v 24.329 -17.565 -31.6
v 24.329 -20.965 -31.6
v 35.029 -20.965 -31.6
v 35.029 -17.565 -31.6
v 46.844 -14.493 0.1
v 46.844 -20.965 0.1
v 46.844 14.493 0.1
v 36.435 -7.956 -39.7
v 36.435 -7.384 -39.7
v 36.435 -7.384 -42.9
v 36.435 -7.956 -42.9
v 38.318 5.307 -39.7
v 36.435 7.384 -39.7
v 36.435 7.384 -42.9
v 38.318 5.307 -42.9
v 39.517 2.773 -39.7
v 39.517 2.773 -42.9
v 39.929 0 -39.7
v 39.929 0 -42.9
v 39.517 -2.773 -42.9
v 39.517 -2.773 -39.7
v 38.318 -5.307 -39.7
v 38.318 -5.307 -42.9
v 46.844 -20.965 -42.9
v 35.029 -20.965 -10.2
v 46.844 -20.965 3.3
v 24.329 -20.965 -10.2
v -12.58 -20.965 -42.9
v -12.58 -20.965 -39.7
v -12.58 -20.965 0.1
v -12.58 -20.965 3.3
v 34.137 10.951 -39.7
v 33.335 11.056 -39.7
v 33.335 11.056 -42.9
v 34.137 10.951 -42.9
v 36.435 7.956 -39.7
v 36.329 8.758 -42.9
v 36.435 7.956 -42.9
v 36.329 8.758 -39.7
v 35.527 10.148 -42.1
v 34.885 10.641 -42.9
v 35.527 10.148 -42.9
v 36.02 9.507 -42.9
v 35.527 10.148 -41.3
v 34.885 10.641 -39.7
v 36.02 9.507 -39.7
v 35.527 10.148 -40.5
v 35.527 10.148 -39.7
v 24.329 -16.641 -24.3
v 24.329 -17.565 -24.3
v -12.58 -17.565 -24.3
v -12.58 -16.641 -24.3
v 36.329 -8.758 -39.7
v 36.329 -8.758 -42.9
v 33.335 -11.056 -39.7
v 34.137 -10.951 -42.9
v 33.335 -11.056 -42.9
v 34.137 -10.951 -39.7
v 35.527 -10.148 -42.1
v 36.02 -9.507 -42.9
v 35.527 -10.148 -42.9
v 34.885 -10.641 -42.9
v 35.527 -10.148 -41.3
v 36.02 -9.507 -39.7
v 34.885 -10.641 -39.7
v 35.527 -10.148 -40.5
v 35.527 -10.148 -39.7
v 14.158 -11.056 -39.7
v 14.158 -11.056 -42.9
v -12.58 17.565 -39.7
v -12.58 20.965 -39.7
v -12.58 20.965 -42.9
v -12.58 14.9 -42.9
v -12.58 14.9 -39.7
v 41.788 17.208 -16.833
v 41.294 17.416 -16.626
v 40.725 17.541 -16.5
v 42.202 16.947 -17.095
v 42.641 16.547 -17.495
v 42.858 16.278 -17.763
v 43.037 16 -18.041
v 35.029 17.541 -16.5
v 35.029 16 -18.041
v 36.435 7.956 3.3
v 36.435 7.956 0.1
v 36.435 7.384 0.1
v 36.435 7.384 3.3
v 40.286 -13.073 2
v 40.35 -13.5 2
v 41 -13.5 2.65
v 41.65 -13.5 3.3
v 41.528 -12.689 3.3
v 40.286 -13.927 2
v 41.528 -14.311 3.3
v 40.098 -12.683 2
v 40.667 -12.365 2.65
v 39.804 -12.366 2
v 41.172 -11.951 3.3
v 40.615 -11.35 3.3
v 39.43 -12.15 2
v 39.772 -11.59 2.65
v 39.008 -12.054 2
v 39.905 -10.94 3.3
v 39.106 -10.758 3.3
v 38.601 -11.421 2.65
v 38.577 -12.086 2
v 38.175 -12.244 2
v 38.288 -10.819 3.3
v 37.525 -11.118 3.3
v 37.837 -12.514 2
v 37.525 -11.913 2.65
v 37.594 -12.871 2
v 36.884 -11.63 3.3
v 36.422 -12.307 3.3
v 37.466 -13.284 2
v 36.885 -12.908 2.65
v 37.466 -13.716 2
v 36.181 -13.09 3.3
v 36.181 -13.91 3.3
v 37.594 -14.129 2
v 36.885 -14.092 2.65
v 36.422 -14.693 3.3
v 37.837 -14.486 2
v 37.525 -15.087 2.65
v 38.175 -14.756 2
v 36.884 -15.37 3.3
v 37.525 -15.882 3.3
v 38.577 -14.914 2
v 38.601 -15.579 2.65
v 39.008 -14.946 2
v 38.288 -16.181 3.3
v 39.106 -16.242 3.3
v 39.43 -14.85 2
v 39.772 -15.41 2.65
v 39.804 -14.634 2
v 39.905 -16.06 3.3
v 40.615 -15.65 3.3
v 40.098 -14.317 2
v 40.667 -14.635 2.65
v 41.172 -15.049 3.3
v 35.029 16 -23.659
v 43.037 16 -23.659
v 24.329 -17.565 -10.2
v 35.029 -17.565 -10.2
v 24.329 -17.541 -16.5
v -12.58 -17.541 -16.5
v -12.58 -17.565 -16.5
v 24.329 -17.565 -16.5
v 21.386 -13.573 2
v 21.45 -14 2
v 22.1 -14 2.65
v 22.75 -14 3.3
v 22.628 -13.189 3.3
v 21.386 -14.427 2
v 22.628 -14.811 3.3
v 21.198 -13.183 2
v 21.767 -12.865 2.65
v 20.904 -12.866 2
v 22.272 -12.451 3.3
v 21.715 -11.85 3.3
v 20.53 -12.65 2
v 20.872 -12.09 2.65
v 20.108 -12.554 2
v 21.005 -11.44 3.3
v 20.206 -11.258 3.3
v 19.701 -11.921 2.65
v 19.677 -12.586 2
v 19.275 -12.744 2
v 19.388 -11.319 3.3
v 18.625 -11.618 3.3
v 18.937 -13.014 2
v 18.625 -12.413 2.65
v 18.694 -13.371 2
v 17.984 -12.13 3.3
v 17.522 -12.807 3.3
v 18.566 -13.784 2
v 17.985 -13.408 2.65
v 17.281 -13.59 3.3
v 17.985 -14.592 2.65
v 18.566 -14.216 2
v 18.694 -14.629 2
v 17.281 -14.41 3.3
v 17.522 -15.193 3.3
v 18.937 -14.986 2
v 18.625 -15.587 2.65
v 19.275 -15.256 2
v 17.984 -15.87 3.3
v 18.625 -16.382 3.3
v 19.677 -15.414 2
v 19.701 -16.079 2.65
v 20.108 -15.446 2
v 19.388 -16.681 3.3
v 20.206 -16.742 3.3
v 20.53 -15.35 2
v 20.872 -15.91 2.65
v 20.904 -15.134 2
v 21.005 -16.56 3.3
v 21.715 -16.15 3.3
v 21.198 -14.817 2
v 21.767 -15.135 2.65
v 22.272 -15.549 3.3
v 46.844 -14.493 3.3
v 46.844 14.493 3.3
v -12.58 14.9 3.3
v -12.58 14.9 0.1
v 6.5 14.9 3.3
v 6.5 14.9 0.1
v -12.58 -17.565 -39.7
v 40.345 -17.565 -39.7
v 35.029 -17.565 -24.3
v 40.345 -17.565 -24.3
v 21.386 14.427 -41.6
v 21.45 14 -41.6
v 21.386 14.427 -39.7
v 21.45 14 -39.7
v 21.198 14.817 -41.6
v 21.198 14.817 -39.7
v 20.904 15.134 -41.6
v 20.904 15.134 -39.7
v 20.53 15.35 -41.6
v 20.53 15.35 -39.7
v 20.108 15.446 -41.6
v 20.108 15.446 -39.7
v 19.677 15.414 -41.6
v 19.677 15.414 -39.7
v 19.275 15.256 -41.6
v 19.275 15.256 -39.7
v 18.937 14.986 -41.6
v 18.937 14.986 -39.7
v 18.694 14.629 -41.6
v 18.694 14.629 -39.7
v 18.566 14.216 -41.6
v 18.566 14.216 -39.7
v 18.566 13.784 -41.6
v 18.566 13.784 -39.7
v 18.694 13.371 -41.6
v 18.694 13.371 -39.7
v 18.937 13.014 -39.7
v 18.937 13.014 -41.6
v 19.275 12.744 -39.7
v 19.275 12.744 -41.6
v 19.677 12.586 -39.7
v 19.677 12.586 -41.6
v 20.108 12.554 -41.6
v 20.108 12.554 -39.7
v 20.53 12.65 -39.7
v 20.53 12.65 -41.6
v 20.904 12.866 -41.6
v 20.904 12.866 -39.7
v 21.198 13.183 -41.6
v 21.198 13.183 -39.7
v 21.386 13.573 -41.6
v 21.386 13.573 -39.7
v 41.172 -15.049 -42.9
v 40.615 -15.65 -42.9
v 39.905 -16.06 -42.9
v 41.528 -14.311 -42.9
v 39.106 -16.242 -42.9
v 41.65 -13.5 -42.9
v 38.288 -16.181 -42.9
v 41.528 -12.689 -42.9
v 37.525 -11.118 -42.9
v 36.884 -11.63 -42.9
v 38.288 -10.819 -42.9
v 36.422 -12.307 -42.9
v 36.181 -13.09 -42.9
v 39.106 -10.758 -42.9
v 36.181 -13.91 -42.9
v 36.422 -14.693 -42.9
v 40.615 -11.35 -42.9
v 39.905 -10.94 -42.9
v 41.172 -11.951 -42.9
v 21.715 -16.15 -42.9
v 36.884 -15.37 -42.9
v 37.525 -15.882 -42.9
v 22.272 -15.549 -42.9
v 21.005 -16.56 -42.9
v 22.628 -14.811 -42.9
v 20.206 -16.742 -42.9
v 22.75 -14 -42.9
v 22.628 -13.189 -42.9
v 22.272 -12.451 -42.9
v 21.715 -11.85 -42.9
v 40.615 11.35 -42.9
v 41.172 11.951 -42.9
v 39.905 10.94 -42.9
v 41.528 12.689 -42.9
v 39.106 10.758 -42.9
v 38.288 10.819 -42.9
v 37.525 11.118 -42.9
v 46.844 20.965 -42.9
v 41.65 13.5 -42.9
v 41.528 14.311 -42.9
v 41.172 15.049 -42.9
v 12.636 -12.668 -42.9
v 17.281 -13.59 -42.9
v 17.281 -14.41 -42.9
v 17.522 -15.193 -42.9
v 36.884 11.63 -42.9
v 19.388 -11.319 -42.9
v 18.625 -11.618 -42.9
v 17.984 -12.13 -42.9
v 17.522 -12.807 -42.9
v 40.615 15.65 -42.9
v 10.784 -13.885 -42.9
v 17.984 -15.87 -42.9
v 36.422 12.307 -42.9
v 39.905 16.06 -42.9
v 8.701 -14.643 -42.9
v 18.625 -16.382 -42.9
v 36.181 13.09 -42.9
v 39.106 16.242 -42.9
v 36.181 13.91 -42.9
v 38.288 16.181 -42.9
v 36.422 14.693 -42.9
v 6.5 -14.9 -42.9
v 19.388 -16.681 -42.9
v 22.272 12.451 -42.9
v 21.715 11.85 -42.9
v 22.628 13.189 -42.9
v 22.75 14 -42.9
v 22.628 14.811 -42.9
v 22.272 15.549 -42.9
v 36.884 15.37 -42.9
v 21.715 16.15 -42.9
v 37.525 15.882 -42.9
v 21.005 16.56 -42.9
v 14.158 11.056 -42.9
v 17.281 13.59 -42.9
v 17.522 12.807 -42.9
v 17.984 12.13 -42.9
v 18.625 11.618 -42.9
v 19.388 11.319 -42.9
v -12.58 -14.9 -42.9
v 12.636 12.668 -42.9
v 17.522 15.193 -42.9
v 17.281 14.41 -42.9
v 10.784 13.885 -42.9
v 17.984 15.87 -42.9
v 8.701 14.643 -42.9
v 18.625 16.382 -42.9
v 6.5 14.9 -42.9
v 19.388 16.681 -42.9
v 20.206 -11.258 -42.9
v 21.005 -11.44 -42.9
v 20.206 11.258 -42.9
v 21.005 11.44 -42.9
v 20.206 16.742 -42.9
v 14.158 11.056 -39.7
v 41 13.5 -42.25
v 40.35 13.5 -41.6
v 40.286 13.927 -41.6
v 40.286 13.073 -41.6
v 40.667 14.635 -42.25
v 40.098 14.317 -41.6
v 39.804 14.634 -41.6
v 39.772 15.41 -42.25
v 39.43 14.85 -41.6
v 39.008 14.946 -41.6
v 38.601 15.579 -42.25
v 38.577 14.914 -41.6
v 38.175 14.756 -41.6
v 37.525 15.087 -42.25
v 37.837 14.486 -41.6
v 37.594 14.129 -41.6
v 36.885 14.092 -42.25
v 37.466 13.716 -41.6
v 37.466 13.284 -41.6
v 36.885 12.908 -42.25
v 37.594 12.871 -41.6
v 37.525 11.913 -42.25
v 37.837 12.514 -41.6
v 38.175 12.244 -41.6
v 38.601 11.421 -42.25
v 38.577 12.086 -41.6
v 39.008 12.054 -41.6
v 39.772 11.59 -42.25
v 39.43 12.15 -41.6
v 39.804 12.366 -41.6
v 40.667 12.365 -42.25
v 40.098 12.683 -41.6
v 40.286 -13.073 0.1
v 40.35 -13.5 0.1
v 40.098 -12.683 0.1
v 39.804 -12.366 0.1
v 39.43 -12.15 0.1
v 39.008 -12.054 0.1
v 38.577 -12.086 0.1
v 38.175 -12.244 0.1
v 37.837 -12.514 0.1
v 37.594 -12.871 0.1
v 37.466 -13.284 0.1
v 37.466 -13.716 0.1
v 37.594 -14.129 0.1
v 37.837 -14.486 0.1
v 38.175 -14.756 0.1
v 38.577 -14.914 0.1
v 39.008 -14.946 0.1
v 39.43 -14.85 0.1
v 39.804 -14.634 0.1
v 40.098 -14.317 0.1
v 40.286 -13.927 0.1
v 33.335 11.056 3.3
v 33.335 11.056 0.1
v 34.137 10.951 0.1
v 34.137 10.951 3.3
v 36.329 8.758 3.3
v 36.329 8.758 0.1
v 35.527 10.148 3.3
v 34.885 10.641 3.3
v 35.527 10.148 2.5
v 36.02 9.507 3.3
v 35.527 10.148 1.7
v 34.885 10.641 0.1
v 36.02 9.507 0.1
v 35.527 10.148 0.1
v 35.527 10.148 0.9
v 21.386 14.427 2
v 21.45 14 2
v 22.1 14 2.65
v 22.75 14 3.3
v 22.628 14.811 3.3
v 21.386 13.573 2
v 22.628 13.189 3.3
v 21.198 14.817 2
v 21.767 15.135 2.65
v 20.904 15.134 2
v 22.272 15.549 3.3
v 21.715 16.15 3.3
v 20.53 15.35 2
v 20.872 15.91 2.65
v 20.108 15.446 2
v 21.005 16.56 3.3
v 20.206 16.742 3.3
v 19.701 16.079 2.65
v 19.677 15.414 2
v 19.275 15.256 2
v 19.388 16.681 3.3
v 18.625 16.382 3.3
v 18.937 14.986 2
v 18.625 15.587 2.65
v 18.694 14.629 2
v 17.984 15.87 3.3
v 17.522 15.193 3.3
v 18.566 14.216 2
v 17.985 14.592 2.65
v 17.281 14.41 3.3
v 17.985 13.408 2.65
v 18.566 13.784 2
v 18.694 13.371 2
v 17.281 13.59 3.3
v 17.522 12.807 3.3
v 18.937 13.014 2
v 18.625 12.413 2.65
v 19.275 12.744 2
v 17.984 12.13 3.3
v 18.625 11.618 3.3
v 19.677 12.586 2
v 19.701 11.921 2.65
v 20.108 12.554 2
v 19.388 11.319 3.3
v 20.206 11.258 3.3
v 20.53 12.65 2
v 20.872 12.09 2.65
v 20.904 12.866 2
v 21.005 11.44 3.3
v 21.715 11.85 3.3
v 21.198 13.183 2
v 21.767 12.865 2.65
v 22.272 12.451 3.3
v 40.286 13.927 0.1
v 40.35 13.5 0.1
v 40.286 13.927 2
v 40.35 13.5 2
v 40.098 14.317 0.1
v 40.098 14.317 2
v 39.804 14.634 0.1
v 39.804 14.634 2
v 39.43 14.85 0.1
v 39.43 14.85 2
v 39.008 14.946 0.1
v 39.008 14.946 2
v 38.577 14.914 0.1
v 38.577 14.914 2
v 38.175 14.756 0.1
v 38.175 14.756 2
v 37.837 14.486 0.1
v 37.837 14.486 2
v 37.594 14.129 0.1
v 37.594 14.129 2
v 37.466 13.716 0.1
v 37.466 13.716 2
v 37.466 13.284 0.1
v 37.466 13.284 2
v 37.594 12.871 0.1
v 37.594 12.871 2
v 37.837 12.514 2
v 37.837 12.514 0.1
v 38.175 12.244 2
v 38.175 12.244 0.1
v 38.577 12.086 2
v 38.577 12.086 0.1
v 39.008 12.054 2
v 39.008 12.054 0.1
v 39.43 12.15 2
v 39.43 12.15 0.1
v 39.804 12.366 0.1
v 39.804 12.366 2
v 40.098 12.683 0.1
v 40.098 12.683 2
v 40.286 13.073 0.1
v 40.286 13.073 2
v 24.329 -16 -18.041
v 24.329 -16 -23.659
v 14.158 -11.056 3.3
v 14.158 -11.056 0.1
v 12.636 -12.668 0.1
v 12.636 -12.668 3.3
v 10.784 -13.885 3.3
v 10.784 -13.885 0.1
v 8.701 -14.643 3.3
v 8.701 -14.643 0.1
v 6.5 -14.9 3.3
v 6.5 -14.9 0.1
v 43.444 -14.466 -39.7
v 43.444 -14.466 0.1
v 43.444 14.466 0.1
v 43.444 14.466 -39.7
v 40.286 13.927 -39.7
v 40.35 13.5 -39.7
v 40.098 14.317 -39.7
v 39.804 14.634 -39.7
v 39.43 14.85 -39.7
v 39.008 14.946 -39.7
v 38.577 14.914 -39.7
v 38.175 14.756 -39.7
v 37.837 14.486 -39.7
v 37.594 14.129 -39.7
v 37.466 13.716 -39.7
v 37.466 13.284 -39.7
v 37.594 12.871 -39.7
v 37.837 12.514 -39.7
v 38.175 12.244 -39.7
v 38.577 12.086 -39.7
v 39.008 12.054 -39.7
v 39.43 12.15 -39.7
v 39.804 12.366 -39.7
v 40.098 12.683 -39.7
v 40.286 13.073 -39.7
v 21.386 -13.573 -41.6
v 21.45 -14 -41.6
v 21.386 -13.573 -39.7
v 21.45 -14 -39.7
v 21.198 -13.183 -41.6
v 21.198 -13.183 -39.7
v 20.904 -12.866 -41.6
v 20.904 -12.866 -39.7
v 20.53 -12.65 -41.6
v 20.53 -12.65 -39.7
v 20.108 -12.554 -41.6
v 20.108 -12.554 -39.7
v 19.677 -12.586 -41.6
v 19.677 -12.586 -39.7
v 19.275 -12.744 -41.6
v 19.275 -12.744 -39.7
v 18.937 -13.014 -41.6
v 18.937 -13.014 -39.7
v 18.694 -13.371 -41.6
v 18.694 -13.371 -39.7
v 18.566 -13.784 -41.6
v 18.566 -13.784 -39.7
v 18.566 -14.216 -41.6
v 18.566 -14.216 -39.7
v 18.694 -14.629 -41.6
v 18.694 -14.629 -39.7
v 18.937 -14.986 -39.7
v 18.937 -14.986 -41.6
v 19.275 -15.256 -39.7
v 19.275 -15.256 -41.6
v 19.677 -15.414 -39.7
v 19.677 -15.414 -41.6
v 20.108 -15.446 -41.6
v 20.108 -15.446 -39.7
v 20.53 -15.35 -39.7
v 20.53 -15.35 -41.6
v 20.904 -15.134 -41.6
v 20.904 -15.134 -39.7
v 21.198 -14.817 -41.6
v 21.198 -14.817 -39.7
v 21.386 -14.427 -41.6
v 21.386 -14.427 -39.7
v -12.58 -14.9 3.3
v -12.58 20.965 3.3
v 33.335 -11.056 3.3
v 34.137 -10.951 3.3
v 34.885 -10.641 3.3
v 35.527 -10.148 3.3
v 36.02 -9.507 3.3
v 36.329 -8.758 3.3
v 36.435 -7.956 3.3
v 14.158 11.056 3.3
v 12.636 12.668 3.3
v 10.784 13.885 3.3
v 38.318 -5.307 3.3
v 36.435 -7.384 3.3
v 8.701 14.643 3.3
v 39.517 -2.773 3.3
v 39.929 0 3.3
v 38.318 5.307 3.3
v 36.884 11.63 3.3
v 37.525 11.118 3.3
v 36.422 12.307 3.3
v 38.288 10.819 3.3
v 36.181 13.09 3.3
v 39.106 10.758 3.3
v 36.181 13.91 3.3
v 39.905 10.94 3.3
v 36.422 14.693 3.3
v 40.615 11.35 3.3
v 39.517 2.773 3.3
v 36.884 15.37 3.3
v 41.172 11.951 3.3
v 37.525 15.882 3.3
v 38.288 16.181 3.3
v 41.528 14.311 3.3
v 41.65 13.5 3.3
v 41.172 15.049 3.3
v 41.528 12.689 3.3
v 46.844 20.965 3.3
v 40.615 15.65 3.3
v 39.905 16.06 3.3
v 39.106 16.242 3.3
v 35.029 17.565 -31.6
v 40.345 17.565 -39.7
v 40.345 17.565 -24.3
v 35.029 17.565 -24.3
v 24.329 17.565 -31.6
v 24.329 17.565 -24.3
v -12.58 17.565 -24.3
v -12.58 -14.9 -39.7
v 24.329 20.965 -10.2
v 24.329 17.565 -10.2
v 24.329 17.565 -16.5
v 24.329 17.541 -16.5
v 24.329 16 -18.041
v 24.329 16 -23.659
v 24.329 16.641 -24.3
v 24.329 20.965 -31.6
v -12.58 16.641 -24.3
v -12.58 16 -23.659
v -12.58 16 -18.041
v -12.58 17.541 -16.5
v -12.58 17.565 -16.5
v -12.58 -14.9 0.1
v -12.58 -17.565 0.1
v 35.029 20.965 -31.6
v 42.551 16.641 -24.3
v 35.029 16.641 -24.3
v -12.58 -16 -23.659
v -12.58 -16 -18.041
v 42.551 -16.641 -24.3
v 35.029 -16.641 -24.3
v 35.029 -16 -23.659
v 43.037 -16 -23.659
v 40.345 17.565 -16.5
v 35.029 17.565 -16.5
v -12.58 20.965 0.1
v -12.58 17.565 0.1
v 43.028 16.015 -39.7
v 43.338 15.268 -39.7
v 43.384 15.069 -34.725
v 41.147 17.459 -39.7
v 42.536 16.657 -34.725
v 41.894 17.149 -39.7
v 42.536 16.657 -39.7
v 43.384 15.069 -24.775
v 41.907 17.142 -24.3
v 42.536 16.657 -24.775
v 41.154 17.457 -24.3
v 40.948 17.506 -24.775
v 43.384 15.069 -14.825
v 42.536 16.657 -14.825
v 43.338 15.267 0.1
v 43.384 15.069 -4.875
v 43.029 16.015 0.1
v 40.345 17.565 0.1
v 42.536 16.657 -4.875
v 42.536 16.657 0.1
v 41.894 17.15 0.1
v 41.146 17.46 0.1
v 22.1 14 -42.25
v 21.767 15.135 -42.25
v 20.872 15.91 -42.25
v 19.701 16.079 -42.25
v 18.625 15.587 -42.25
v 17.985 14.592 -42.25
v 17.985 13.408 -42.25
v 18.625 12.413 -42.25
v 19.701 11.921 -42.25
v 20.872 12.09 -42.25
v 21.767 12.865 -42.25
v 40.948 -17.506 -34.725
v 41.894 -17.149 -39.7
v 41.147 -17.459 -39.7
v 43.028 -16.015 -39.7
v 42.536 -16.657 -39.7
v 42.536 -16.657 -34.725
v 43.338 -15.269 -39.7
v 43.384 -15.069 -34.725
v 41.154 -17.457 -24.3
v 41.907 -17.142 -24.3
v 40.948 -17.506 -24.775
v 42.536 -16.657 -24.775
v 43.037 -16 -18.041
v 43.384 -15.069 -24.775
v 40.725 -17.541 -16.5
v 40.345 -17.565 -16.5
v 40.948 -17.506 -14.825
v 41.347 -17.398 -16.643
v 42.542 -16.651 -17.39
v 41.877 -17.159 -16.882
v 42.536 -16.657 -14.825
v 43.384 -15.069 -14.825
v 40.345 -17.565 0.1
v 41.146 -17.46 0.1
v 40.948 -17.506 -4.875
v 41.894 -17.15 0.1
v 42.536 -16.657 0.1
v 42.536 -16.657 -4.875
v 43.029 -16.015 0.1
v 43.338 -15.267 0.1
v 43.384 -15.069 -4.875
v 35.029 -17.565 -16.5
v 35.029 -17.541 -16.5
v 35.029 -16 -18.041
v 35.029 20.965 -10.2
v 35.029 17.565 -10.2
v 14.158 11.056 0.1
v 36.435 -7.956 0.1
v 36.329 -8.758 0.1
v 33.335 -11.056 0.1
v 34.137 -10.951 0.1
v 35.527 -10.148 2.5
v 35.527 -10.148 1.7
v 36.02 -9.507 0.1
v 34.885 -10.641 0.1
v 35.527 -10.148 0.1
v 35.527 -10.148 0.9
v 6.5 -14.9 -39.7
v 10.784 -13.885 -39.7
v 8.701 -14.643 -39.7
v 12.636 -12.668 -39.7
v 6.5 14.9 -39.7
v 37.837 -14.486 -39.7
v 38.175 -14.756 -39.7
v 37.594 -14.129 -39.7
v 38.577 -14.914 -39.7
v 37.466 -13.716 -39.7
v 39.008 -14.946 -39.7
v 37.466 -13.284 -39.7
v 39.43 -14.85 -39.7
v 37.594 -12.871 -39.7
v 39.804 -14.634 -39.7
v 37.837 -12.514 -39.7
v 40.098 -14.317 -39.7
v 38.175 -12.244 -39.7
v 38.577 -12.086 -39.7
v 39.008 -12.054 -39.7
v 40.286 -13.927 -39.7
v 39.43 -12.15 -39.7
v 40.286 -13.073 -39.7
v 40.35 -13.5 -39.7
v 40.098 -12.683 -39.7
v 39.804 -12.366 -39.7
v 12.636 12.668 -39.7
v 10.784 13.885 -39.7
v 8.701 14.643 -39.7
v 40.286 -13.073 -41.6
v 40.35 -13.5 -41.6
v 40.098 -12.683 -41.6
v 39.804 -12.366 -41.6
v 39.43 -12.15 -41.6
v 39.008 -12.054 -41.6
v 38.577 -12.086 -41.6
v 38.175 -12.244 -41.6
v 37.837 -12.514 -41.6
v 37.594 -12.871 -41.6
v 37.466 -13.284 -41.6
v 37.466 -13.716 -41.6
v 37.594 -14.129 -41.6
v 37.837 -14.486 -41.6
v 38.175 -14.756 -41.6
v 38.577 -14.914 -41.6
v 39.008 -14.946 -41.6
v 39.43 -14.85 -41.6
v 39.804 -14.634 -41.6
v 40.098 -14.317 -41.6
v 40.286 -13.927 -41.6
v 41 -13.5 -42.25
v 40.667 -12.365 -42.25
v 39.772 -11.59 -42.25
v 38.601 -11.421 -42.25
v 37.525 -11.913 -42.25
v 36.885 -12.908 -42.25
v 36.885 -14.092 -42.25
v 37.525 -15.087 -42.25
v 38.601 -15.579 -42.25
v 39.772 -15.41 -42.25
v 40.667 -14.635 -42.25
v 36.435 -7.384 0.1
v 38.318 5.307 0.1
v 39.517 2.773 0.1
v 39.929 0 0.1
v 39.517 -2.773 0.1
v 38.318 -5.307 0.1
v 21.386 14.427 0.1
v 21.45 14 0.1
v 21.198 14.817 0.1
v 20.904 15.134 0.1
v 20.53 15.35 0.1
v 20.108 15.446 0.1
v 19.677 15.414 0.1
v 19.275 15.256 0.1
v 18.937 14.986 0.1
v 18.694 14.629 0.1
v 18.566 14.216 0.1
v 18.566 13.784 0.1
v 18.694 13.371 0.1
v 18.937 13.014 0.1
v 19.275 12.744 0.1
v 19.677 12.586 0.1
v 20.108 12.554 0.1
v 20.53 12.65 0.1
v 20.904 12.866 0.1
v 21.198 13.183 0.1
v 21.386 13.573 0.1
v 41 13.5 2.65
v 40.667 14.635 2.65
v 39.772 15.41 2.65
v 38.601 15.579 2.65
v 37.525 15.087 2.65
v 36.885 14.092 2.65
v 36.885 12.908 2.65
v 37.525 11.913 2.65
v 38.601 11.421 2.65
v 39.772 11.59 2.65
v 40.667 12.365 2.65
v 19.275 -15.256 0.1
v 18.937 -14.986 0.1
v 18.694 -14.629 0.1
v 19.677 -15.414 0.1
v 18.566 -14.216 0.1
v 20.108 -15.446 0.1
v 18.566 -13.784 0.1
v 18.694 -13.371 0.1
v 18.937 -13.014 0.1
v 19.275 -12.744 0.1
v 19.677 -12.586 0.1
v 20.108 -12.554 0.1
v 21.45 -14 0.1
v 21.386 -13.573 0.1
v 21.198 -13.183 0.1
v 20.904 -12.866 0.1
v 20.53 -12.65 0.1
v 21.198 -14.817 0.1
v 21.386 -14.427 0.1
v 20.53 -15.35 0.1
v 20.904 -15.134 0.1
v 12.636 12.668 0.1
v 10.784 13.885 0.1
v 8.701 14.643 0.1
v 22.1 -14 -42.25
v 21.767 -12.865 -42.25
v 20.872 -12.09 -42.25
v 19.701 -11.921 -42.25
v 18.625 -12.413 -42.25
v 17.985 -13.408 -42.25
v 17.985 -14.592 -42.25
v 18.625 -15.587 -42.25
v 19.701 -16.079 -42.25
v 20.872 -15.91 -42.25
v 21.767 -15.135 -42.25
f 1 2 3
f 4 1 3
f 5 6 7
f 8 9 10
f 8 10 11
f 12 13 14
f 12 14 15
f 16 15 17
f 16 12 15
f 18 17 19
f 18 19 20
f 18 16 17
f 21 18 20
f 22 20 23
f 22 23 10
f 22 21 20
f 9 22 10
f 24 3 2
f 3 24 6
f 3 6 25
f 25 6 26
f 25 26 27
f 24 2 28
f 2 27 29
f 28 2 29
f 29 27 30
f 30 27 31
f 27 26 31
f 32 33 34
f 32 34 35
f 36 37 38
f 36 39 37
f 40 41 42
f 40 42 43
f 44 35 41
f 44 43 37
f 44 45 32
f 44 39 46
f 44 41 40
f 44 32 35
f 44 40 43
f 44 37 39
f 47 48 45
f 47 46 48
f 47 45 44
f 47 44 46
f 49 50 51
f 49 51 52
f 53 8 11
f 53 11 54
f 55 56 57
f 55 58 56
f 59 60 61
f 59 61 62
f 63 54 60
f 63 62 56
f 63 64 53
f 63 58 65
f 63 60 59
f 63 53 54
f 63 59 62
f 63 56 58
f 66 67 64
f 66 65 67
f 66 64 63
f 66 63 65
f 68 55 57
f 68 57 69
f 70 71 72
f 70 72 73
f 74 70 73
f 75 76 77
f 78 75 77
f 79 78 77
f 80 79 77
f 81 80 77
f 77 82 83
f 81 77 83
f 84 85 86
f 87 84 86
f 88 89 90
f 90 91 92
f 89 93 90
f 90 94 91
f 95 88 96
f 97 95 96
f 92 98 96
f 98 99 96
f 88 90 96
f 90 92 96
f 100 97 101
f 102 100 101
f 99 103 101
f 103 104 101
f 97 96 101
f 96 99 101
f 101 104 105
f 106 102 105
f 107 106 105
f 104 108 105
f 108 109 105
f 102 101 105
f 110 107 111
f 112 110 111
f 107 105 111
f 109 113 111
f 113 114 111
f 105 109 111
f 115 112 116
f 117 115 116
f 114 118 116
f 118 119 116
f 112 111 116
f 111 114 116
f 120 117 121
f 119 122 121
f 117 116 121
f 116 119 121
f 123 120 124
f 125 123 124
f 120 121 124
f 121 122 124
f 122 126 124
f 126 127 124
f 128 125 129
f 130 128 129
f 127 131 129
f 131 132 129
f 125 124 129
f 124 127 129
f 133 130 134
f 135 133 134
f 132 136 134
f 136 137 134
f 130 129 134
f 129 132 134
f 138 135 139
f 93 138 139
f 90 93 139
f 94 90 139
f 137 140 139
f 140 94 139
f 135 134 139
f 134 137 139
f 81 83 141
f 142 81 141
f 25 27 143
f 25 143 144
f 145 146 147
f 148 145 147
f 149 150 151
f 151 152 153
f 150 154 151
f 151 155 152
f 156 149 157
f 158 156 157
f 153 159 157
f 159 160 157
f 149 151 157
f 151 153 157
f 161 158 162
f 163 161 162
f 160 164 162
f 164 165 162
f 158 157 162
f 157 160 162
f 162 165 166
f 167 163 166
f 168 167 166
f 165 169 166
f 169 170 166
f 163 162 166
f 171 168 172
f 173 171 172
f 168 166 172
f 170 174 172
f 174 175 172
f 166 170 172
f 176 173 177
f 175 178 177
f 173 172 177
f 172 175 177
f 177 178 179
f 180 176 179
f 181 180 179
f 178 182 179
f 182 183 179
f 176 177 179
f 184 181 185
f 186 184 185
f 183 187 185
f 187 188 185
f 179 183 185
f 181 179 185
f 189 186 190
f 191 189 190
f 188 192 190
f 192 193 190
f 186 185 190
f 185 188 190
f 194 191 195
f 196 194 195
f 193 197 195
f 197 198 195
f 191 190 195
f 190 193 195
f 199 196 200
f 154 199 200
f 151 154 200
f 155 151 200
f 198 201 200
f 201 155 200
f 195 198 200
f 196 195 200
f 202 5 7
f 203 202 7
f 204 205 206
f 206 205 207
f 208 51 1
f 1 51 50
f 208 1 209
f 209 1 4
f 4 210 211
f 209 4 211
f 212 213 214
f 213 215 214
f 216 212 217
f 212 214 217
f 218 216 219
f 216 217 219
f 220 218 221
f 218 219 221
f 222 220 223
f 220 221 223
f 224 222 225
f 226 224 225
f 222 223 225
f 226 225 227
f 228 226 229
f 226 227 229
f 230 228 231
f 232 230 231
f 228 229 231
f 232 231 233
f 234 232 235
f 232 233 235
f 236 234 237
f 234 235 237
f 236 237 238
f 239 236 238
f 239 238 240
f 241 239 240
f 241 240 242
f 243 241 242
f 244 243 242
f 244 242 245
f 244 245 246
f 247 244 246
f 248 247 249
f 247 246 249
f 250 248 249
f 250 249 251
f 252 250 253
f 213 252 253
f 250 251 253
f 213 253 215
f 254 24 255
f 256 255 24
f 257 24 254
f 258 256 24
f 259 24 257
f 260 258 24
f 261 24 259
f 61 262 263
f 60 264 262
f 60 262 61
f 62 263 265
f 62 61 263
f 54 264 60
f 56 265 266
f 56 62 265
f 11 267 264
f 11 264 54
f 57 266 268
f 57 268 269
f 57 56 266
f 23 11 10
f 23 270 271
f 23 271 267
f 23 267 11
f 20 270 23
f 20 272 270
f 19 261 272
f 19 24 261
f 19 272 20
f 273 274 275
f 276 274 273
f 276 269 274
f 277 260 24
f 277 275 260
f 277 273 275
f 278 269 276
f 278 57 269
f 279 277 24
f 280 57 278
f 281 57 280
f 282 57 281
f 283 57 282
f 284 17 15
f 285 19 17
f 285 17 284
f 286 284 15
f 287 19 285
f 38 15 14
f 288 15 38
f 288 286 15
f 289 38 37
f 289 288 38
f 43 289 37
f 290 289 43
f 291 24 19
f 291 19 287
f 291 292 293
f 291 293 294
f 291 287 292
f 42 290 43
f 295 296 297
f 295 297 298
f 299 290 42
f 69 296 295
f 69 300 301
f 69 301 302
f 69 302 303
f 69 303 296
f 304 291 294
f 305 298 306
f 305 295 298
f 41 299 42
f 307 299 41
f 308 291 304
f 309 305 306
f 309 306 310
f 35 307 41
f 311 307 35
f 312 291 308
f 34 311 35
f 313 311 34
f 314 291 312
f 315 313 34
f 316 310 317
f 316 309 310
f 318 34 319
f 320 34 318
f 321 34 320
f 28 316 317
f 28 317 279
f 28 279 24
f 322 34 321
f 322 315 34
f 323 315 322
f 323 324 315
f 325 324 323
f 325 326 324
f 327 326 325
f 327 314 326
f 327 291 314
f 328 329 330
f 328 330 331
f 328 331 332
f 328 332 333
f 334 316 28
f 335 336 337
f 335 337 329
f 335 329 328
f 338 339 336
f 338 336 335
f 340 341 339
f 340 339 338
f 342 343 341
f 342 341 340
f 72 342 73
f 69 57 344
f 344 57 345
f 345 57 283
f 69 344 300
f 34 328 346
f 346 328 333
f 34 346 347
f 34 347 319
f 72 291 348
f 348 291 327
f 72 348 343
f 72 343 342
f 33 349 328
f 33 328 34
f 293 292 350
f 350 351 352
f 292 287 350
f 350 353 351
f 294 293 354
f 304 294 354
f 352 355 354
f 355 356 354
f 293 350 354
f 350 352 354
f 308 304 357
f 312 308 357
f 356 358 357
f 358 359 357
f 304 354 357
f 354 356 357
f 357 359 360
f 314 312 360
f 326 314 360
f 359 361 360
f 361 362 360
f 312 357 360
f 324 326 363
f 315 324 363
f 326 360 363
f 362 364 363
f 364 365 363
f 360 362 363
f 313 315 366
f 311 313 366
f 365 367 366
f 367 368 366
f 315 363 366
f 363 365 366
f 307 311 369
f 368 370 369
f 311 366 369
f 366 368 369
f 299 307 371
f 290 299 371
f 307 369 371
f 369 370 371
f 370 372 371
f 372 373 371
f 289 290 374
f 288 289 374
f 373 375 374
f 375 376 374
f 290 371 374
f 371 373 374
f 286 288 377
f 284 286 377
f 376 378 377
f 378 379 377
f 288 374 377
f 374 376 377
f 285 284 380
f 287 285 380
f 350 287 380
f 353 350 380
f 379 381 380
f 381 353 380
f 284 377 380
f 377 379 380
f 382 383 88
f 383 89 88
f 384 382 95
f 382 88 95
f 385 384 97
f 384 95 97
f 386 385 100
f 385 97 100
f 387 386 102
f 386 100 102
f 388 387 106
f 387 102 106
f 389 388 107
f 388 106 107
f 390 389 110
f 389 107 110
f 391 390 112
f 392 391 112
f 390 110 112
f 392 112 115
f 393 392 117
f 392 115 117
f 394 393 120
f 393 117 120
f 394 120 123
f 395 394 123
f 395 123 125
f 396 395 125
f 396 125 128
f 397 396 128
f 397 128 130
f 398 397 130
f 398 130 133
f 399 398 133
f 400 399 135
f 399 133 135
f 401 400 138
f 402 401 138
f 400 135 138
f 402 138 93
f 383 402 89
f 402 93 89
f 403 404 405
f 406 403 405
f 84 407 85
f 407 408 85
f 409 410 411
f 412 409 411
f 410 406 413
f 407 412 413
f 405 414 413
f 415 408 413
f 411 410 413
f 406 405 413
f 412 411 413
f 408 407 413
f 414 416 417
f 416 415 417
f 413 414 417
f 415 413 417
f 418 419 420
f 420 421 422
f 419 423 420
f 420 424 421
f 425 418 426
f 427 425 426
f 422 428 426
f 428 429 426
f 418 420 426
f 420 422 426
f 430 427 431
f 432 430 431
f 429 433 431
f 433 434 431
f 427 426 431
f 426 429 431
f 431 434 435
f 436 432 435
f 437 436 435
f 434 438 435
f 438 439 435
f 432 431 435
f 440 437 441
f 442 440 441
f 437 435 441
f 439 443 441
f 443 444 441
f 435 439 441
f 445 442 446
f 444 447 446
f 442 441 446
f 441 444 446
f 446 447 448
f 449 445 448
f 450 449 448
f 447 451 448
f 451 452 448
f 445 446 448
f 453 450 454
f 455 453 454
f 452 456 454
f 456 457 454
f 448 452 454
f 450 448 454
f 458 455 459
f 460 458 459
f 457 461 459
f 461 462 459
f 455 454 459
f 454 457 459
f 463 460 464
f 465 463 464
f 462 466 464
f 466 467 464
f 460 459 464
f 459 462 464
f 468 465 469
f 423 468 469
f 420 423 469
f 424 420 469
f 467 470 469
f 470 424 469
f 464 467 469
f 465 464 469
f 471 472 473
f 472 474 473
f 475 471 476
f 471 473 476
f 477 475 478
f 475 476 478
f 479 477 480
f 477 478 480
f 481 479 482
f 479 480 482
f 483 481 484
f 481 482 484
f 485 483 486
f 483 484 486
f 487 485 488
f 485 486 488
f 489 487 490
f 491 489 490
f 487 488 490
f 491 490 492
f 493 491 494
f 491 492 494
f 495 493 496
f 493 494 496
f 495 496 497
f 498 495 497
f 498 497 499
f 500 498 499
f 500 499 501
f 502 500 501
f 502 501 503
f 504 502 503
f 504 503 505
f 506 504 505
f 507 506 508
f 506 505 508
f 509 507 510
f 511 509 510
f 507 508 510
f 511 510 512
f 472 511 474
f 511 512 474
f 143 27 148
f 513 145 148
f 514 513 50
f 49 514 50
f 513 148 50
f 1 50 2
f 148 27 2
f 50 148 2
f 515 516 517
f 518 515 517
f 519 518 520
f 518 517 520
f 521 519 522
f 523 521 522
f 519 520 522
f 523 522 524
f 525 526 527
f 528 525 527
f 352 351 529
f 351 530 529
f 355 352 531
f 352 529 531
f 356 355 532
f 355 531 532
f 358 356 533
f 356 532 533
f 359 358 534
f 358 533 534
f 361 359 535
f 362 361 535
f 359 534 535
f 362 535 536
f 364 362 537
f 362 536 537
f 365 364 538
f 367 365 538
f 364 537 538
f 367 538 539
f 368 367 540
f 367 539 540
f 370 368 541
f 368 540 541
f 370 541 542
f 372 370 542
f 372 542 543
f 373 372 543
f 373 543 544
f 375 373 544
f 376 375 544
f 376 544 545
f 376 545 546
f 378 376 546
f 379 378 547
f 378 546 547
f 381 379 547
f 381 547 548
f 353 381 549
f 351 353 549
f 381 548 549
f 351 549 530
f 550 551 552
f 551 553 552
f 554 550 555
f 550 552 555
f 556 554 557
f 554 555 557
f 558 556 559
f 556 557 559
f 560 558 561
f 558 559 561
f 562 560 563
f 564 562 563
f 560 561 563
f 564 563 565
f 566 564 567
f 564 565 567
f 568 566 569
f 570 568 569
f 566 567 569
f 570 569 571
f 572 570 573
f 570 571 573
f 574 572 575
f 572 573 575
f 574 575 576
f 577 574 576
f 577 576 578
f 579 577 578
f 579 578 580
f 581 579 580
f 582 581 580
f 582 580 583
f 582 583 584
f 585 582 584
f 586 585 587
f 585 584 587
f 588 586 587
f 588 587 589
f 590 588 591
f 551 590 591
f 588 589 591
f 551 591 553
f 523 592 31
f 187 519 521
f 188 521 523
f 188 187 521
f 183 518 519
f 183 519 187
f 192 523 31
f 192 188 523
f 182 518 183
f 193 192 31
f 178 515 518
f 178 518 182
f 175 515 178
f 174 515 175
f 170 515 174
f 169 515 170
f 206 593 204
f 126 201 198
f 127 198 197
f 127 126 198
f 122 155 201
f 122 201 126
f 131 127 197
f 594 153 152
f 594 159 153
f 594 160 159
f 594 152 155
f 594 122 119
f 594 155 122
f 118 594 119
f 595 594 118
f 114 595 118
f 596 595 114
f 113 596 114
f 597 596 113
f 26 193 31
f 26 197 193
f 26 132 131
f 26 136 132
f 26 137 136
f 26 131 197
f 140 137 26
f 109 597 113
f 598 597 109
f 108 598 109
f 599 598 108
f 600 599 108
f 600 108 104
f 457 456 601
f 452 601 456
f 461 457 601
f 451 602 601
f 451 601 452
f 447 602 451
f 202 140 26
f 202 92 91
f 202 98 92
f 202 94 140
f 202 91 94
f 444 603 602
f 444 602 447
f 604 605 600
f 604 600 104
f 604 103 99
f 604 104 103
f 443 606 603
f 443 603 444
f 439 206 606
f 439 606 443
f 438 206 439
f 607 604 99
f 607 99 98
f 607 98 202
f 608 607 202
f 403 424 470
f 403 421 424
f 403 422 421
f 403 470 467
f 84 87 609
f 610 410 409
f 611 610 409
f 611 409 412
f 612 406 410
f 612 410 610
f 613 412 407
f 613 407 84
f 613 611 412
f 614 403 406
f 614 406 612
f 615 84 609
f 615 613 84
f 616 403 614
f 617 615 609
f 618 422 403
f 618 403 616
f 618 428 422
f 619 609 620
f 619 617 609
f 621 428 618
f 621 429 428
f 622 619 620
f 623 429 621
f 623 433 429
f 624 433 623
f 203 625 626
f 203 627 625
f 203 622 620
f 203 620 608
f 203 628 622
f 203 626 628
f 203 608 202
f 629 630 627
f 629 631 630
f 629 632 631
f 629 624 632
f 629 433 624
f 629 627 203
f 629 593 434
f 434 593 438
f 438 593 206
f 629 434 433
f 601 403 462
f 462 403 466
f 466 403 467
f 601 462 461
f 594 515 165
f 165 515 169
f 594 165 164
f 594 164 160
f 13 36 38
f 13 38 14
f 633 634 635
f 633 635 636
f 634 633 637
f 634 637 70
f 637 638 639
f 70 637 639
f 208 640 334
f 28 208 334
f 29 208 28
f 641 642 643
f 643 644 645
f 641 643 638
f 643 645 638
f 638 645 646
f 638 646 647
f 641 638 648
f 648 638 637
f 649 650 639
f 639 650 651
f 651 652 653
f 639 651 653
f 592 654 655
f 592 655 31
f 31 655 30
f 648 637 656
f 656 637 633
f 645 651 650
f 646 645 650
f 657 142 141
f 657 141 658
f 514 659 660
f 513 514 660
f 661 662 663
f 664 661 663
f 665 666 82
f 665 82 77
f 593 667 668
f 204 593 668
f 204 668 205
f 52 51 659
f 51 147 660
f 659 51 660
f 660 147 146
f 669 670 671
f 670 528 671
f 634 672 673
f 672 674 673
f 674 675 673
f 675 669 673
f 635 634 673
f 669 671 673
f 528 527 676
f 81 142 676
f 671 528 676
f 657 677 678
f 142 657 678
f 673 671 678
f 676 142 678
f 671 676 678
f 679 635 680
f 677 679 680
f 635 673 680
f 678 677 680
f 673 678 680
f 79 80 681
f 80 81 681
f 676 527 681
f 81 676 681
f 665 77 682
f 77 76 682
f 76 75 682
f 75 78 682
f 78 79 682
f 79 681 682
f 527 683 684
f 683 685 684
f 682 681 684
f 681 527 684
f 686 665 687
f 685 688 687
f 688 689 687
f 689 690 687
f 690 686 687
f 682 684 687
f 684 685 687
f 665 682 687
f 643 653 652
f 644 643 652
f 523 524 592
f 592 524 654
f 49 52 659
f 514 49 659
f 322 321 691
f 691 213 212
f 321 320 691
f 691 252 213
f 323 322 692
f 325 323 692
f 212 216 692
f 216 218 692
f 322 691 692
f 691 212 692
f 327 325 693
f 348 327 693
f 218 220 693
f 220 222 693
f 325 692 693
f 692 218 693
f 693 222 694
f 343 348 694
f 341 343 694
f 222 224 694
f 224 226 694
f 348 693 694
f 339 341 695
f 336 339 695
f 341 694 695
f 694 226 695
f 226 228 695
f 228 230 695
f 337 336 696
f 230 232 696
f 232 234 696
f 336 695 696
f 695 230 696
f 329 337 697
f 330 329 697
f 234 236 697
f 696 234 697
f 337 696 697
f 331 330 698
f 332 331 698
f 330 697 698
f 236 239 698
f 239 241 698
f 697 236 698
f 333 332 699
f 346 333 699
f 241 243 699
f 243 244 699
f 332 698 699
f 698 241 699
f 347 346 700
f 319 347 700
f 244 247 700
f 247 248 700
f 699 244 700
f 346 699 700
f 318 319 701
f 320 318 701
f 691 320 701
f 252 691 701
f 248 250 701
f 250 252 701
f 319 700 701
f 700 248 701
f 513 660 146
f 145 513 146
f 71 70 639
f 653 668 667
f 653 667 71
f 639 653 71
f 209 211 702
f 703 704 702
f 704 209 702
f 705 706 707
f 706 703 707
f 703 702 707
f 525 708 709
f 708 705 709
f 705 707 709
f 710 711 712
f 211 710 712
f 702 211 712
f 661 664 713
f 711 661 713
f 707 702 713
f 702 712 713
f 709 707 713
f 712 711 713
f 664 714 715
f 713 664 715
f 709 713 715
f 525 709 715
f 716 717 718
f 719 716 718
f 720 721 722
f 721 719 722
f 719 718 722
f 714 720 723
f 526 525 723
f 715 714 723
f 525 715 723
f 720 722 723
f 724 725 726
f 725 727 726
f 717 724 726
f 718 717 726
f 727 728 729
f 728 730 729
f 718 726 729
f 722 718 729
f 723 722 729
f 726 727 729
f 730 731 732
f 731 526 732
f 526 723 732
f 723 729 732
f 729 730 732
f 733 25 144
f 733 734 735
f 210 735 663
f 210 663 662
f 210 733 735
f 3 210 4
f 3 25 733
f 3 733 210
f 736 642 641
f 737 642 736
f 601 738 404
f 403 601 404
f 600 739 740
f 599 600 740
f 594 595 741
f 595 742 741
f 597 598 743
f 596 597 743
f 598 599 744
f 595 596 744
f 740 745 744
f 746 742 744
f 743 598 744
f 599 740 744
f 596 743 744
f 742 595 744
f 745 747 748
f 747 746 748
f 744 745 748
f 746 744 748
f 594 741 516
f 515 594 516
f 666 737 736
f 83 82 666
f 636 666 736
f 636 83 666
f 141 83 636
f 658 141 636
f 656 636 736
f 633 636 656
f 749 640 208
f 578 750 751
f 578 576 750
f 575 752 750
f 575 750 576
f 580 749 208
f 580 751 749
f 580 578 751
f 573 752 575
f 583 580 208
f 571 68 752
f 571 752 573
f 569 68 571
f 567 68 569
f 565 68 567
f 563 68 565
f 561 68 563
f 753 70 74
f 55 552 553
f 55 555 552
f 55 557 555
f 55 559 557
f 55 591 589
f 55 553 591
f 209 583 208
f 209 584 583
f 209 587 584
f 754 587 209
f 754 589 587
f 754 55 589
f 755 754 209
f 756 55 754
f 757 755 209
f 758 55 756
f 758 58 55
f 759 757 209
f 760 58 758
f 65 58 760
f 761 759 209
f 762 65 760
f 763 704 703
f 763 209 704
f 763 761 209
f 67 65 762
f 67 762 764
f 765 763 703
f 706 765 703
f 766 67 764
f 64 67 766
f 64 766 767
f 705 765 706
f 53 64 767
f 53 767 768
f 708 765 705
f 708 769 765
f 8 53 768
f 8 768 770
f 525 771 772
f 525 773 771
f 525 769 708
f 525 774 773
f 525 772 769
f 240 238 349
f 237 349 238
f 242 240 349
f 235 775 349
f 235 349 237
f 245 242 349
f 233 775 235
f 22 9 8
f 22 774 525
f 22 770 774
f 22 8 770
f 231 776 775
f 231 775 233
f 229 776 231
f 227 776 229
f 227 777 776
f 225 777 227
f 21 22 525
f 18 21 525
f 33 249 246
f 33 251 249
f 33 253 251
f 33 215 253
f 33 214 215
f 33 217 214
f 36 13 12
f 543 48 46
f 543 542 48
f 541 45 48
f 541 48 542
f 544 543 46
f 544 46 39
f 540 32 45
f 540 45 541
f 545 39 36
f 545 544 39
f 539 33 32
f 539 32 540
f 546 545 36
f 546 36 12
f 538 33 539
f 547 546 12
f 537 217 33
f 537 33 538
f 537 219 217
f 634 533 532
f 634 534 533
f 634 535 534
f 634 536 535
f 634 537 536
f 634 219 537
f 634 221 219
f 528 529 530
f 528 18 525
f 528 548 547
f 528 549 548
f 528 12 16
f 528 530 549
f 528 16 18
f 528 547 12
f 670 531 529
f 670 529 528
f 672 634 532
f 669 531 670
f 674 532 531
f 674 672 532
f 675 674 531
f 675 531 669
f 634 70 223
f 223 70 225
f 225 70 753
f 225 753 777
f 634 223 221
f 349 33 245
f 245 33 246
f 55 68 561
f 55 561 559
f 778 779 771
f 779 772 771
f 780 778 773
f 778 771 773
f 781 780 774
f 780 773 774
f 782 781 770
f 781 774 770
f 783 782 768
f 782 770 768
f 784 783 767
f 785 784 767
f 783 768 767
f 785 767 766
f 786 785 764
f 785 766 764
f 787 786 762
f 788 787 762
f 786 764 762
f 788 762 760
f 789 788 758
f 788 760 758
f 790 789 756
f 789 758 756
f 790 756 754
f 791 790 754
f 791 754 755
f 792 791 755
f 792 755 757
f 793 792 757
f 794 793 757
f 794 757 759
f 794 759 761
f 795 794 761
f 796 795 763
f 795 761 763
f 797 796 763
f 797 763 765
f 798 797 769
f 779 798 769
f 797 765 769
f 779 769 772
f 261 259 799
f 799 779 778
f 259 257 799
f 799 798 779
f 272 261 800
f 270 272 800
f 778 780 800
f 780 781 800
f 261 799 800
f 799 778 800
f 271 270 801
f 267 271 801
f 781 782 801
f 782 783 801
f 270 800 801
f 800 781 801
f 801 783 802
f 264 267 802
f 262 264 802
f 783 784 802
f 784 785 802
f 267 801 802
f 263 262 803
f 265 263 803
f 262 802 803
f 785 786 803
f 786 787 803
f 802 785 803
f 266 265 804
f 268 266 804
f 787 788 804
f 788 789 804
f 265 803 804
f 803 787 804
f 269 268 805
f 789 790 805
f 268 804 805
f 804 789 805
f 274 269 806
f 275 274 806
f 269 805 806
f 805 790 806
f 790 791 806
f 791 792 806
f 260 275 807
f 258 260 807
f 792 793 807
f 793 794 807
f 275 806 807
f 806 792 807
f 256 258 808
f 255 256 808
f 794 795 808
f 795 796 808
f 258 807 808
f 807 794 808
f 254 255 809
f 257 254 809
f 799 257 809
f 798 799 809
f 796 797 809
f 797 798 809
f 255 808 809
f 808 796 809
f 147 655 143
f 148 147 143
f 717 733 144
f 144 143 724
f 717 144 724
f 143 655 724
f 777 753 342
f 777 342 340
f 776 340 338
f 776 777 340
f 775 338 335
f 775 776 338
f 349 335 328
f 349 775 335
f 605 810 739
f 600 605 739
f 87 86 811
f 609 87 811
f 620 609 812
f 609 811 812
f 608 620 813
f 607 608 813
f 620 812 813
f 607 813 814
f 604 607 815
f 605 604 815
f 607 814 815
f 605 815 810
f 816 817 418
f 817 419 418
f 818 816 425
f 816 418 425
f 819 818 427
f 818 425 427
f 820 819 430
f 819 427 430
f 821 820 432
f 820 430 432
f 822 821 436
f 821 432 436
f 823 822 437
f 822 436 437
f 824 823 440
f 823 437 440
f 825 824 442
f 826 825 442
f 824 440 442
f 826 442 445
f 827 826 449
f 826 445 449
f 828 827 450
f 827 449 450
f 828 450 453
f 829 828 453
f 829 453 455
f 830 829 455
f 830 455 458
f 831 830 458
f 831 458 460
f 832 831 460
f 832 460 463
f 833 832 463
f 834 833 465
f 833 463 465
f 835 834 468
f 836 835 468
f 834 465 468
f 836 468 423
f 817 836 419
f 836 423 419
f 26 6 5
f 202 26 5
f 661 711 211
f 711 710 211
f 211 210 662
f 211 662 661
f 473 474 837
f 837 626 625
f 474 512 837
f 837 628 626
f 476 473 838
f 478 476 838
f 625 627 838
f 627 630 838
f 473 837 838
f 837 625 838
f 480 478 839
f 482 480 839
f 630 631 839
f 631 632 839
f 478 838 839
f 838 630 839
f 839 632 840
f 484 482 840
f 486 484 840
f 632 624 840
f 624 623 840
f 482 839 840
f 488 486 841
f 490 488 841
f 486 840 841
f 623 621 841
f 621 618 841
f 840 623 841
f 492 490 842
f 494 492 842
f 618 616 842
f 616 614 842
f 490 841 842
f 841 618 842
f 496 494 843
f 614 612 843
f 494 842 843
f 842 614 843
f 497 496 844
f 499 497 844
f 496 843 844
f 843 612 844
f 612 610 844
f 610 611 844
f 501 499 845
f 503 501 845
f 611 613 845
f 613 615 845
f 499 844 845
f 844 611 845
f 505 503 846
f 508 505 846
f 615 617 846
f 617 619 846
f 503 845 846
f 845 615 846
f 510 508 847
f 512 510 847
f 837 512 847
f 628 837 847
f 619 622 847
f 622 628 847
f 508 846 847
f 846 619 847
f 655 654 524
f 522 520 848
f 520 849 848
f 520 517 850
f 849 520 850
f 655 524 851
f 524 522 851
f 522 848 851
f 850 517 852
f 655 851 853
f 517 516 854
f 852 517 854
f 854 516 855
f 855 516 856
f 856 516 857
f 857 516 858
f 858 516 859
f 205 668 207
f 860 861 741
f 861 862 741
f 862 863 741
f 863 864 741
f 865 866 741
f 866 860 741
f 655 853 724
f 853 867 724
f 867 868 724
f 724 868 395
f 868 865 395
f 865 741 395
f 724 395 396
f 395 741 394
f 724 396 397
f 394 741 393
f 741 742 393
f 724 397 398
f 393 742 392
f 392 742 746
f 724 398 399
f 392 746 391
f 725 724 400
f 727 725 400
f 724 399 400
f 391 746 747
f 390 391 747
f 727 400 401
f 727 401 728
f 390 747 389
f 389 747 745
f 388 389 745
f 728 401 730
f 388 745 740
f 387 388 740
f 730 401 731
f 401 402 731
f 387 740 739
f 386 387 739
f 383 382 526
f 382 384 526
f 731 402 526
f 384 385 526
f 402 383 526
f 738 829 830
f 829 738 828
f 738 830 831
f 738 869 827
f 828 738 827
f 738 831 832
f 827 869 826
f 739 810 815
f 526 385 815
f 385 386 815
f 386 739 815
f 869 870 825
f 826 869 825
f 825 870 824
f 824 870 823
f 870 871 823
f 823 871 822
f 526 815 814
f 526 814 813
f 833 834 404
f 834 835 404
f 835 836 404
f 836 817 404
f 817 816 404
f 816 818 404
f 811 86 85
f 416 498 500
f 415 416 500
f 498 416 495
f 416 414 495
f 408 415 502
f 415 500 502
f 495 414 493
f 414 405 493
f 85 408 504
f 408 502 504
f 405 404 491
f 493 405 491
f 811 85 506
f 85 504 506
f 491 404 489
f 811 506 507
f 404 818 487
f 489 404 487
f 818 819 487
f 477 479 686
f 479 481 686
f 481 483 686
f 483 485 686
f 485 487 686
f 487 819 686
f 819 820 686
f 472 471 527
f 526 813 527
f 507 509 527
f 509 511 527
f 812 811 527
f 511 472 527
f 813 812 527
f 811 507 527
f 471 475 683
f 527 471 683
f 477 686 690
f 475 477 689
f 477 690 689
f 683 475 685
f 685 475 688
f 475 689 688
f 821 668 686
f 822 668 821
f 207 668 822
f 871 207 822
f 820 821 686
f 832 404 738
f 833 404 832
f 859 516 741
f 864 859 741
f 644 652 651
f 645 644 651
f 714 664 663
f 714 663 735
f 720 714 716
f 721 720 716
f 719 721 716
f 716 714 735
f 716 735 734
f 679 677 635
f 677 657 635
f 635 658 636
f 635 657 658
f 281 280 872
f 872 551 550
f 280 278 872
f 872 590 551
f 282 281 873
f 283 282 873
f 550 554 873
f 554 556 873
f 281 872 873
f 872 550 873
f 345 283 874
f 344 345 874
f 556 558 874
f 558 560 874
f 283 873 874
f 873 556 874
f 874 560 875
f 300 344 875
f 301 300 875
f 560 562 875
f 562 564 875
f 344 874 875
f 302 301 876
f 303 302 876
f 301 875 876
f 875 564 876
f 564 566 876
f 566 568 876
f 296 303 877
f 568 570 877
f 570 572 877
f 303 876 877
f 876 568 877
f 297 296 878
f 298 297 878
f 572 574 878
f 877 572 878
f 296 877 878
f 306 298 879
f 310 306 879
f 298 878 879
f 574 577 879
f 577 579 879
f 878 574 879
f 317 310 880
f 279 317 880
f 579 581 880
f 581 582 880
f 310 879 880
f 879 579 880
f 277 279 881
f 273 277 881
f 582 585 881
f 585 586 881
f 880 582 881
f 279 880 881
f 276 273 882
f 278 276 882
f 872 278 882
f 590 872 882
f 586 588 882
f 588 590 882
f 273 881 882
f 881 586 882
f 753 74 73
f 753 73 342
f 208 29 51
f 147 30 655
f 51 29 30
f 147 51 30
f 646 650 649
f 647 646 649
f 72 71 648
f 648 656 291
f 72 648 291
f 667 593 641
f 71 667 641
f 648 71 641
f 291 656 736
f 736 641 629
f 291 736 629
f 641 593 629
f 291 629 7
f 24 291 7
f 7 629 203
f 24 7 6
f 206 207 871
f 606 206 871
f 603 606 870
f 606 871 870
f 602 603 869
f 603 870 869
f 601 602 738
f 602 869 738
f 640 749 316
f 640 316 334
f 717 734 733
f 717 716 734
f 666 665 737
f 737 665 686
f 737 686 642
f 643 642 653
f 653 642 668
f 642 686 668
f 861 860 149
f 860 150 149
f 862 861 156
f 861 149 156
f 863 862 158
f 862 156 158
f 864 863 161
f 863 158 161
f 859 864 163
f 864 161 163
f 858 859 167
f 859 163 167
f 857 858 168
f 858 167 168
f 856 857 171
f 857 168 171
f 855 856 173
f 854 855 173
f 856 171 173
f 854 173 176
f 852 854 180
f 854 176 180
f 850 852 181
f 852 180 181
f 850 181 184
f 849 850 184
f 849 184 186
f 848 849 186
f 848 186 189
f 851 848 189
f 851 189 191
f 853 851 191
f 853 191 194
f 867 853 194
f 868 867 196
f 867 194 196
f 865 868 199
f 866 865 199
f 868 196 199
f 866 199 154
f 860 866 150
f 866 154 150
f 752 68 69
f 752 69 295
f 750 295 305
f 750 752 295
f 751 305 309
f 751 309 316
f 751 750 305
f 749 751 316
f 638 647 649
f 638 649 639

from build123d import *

# Parameters (mm, degrees)
BOSS_EXTRUDE1_START = 0.1
BOSS_EXTRUDE1_DEPTH = 3.2
BOSS_EXTRUDE4_DEPTH = 43
MIRROR9_START       = -12.580412483
MIRROR9_DEPTH       = 56.024226278
CUT_EXTRUDE1_START  = -41.930024
SKETCH5_W           = 10.7
SKETCH5_H           = 21.400046012
CUT_EXTRUDE1_DEPTH  = 41.930024


with BuildPart() as part:
    # Sketch1 → Boss-Extrude1 (new body)
    with BuildSketch(Plane.XY.offset(BOSS_EXTRUDE1_START)):
        with BuildLine():
            Line((6.5, -20.96501071), (40.371666845, -20.96501071))
            Line((40.371666845, -20.96501071), (46.843813692, -20.96501071))
            Line((46.843813692, -20.96501071), (46.843813692, -14.492829244))
            Line((46.843813692, -14.492829244), (46.843817152, 14.492909287))
            Line((46.843817152, 14.492909287), (46.843817152, 20.965012858))
            Line((46.843817152, 20.965012858), (40.371232335, 20.965012858))
            Line((40.371232335, 20.965012858), (-12.580412483, 20.965012858))
            Line((-12.580412483, 20.965012858), (-12.580412483, 14.9))
            Line((-12.580412483, 14.9), (6.5, 14.9))
            ThreePointArc((6.5, 14.9), (10.784081461, 13.885171119), (14.157668767, 11.056365661))
            Line((14.157668767, 11.056365661), (33.335287122, 11.056365661))
            add(Edge.make_bspline(
                [(33.335287122, 11.056365661), (33.738464028, 11.056365661), (34.553650563, 10.895055506), (35.583998517, 10.205191286), (36.273862737, 9.174843333), (36.435172892, 8.359656798), (36.435172892, 7.956479892)],
                knots=[-0.785360087, -0.785360087, -0.785360087, -0.785360087, -0.392680044, 0, 0.392680044, 0.785360087, 0.785360087, 0.785360087, 0.785360087], degree=3))
            Line((36.435172892, 7.956479892), (36.435172892, 7.38396472))
            ThreePointArc((36.435172892, 7.38396472), (39.928807231, 0), (36.435172892, -7.38396472))
            Line((36.435172892, -7.38396472), (36.435172892, -7.956479892))
            add(Edge.make_bspline(
                [(36.435172892, -7.956479892), (36.435172892, -8.359656798), (36.273862737, -9.174843333), (35.583998517, -10.205191286), (34.553650563, -10.895055506), (33.738464028, -11.056365661), (33.335287122, -11.056365661)],
                knots=[-0.785360087, -0.785360087, -0.785360087, -0.785360087, -0.392680044, 0, 0.392680044, 0.785360087, 0.785360087, 0.785360087, 0.785360087], degree=3))
            Line((33.335287122, -11.056365661), (14.157668767, -11.056365661))
            ThreePointArc((14.157668767, -11.056365661), (10.784081461, -13.885171119), (6.5, -14.9))
            Line((6.5, -14.9), (-12.580412483, -14.9))
            Line((-12.580412483, -14.9), (-12.580412483, -20.96501071))
            Line((-12.580412483, -20.96501071), (6.5, -20.96501071))
        make_face()
    extrude(amount=BOSS_EXTRUDE1_DEPTH)


with BuildPart() as body_2:
    # Mirror8: mirrored copy
    add(part.part.mirror(Plane.XY.offset(-19.8)))


with BuildPart() as part_1:
    add(part.part)

    add(body_2.part)  # Boss-Extrude4 merges body 2
    # Sketch3 → Boss-Extrude4 (add)
    with BuildSketch(Plane(origin=(0, 0, 0.1), x_dir=(-1, 0, 0), z_dir=(0, 0, -1))):
        with BuildLine():
            Line((-46.843817152, -20.96501071), (12.580412483, -20.96501071))
            Line((12.580412483, -20.96501071), (12.580412481, -17.56501071))
            Line((12.580412481, -17.56501071), (-40.344731515, -17.565009918))
            add(Edge.make_bspline(
                [(-40.344731515, -17.565009918), (-40.442934479, -17.56345098), (-40.546251638, -17.560214099), (-40.748160222, -17.540082036), (-40.848537497, -17.525369256), (-41.147208229, -17.466024859), (-41.34230873, -17.40685234), (-41.904876795, -17.173936033), (-42.248881792, -16.944079436), (-42.822875895, -16.370055351), (-43.052718695, -16.026081256), (-43.285678392, -15.463505278), (-43.344823049, -15.268405947), (-43.404196351, -14.969745759), (-43.418915361, -14.869354632), (-43.439033339, -14.667434906), (-43.442259272, -14.564125008), (-43.443813695, -14.465921992)],
                knots=[0, 0, 0, 0, 0.0625, 0.0625, 0.125, 0.125, 0.25, 0.25, 0.5, 0.5, 0.75, 0.75, 0.875, 0.875, 0.9375, 0.9375, 1, 1, 1, 1], degree=3))
            Line((-43.443813695, -14.465921992), (-43.443817149, 14.465924278))
            add(Edge.make_bspline(
                [(-43.443817149, 14.465924278), (-43.442258211, 14.564127242), (-43.43902133, 14.6674444), (-43.418889268, 14.869352985), (-43.404176488, 14.969730261), (-43.344832091, 15.268400993), (-43.285659572, 15.463501494), (-43.052743266, 16.026069561), (-42.822886669, 16.370074559), (-42.248862584, 16.944068663), (-41.904888488, 17.173911463), (-41.342312509, 17.406871161), (-41.147213178, 17.466015819), (-40.84855299, 17.52538912), (-40.748161863, 17.54010813), (-40.546242137, 17.560226109), (-40.442932239, 17.563452042), (-40.344729223, 17.565006465)],
                knots=[0, 0, 0, 0, 0.0625, 0.0625, 0.125, 0.125, 0.25, 0.25, 0.5, 0.5, 0.75, 0.75, 0.875, 0.875, 0.9375, 0.9375, 1, 1, 1, 1], degree=3))
            Line((-40.344729223, 17.565006465), (12.580412471, 17.565012858))
            Line((12.580412471, 17.565012858), (12.580412483, 20.965012858))
            Line((12.580412483, 20.965012858), (-46.843817152, 20.965012858))
            Line((-46.843817152, 20.965012858), (-46.843817152, -20.96501071))
        make_face()
    extrude(amount=BOSS_EXTRUDE4_DEPTH)


with BuildPart() as mirror9_tool:
    # Mirror9: read off the stored shape, not the designer's step
    # Mirror9 outline → Mirror9 (new body)
    with BuildSketch(Plane.YZ.offset(MIRROR9_START)):
        Polygon((17.541421356, -16.5), (16, -18.041421356), (16, -23.658578644), (16.641421356, -24.3), (17.565009661, -24.3), (17.565007122, -16.5), align=None)
        Polygon((-17.56501071, -24.3), (-16.641421356, -24.3), (-16, -23.658578644), (-16, -18.041421356), (-17.541421356, -16.5), (-17.56501071, -16.5), align=None)
    extrude(amount=MIRROR9_DEPTH)


with BuildPart() as part_2:
    add(part_1.part)


with BuildPart() as part_3:
    # Mirror9: joined with mirror9_tool
    add(part_2.part.fuse(mirror9_tool.part, tol=0.00001))

    # Sketch5 → Cut-Extrude1 (cut)
    with BuildSketch(Plane(origin=(0, 20.965012858, 0), x_dir=(1, 0, 0), z_dir=(0, 1, 0)).offset(CUT_EXTRUDE1_START)):
        with Locations((29.678807231, 20.899976994)):
            Rectangle(SKETCH5_W, SKETCH5_H)
    extrude(amount=CUT_EXTRUDE1_DEPTH, mode=Mode.SUBTRACT)

    # CSK for M2.5 Countersunk Flat Head Screw1: read off the stored shape, not the designer's step
    # CSK for M2.5 Countersunk Flat Head S 2 → CSK for M2.5 Countersunk Flat Head Screw1 (revolve, cut)
    with BuildSketch(Plane(origin=(20, -14, 0), x_dir=(1, 0, 0), z_dir=(0, -1, 0))):
        Polygon((1.45, -41.6), (1.45, -39.7), (0, -39.7), (0, -42.9), (2.75, -42.9), align=None)
        Polygon((0, 0.1), (1.45, 0.1), (1.45, 2), (2.75, 3.3), (0, 3.3), align=None)
    revolve(axis=Axis((20, -14, 0), (0, 0, 1)), mode=Mode.SUBTRACT)

    # CSK for M2.5 Countersunk Flat Head S 3 o → CSK for M2.5 Countersunk Flat Head S 3 (revolve, cut)
    with BuildSketch(Plane(origin=(20, 14, 0), x_dir=(1, 0, 0), z_dir=(0, -1, 0))):
        Polygon((1.45, -41.6), (1.45, -39.7), (0, -39.7), (0, -42.9), (2.75, -42.9), align=None)
        Polygon((0, 0.1), (1.45, 0.1), (1.45, 2), (2.75, 3.3), (0, 3.3), align=None)
    revolve(axis=Axis((20, 14, 0), (0, 0, 1)), mode=Mode.SUBTRACT)

    # CSK for M2.5 Countersunk Flat Head S 4 o → CSK for M2.5 Countersunk Flat Head S 4 (revolve, cut)
    with BuildSketch(Plane(origin=(38.9, 13.5, 0), x_dir=(1, 0, 0), z_dir=(0, -1, 0))):
        Polygon((1.45, -41.6), (1.45, -39.7), (0, -39.7), (0, -42.9), (2.75, -42.9), align=None)
        Polygon((0, 0.1), (1.45, 0.1), (1.45, 2), (2.75, 3.3), (0, 3.3), align=None)
    revolve(axis=Axis((38.9, 13.5, 0), (0, 0, 1)), mode=Mode.SUBTRACT)

    # CSK for M2.5 Countersunk Flat Head S 5 o → CSK for M2.5 Countersunk Flat Head S 5 (revolve, cut)
    with BuildSketch(Plane(origin=(38.9, -13.5, 0), x_dir=(1, 0, 0), z_dir=(0, -1, 0))):
        Polygon((1.45, -41.6), (1.45, -39.7), (0, -39.7), (0, -42.9), (2.75, -42.9), align=None)
        Polygon((0, 0.1), (1.45, 0.1), (1.45, 2), (2.75, 3.3), (0, 3.3), align=None)
    revolve(axis=Axis((38.9, -13.5, 0), (0, 0, 1)), mode=Mode.SUBTRACT)


solid = part_3.part
